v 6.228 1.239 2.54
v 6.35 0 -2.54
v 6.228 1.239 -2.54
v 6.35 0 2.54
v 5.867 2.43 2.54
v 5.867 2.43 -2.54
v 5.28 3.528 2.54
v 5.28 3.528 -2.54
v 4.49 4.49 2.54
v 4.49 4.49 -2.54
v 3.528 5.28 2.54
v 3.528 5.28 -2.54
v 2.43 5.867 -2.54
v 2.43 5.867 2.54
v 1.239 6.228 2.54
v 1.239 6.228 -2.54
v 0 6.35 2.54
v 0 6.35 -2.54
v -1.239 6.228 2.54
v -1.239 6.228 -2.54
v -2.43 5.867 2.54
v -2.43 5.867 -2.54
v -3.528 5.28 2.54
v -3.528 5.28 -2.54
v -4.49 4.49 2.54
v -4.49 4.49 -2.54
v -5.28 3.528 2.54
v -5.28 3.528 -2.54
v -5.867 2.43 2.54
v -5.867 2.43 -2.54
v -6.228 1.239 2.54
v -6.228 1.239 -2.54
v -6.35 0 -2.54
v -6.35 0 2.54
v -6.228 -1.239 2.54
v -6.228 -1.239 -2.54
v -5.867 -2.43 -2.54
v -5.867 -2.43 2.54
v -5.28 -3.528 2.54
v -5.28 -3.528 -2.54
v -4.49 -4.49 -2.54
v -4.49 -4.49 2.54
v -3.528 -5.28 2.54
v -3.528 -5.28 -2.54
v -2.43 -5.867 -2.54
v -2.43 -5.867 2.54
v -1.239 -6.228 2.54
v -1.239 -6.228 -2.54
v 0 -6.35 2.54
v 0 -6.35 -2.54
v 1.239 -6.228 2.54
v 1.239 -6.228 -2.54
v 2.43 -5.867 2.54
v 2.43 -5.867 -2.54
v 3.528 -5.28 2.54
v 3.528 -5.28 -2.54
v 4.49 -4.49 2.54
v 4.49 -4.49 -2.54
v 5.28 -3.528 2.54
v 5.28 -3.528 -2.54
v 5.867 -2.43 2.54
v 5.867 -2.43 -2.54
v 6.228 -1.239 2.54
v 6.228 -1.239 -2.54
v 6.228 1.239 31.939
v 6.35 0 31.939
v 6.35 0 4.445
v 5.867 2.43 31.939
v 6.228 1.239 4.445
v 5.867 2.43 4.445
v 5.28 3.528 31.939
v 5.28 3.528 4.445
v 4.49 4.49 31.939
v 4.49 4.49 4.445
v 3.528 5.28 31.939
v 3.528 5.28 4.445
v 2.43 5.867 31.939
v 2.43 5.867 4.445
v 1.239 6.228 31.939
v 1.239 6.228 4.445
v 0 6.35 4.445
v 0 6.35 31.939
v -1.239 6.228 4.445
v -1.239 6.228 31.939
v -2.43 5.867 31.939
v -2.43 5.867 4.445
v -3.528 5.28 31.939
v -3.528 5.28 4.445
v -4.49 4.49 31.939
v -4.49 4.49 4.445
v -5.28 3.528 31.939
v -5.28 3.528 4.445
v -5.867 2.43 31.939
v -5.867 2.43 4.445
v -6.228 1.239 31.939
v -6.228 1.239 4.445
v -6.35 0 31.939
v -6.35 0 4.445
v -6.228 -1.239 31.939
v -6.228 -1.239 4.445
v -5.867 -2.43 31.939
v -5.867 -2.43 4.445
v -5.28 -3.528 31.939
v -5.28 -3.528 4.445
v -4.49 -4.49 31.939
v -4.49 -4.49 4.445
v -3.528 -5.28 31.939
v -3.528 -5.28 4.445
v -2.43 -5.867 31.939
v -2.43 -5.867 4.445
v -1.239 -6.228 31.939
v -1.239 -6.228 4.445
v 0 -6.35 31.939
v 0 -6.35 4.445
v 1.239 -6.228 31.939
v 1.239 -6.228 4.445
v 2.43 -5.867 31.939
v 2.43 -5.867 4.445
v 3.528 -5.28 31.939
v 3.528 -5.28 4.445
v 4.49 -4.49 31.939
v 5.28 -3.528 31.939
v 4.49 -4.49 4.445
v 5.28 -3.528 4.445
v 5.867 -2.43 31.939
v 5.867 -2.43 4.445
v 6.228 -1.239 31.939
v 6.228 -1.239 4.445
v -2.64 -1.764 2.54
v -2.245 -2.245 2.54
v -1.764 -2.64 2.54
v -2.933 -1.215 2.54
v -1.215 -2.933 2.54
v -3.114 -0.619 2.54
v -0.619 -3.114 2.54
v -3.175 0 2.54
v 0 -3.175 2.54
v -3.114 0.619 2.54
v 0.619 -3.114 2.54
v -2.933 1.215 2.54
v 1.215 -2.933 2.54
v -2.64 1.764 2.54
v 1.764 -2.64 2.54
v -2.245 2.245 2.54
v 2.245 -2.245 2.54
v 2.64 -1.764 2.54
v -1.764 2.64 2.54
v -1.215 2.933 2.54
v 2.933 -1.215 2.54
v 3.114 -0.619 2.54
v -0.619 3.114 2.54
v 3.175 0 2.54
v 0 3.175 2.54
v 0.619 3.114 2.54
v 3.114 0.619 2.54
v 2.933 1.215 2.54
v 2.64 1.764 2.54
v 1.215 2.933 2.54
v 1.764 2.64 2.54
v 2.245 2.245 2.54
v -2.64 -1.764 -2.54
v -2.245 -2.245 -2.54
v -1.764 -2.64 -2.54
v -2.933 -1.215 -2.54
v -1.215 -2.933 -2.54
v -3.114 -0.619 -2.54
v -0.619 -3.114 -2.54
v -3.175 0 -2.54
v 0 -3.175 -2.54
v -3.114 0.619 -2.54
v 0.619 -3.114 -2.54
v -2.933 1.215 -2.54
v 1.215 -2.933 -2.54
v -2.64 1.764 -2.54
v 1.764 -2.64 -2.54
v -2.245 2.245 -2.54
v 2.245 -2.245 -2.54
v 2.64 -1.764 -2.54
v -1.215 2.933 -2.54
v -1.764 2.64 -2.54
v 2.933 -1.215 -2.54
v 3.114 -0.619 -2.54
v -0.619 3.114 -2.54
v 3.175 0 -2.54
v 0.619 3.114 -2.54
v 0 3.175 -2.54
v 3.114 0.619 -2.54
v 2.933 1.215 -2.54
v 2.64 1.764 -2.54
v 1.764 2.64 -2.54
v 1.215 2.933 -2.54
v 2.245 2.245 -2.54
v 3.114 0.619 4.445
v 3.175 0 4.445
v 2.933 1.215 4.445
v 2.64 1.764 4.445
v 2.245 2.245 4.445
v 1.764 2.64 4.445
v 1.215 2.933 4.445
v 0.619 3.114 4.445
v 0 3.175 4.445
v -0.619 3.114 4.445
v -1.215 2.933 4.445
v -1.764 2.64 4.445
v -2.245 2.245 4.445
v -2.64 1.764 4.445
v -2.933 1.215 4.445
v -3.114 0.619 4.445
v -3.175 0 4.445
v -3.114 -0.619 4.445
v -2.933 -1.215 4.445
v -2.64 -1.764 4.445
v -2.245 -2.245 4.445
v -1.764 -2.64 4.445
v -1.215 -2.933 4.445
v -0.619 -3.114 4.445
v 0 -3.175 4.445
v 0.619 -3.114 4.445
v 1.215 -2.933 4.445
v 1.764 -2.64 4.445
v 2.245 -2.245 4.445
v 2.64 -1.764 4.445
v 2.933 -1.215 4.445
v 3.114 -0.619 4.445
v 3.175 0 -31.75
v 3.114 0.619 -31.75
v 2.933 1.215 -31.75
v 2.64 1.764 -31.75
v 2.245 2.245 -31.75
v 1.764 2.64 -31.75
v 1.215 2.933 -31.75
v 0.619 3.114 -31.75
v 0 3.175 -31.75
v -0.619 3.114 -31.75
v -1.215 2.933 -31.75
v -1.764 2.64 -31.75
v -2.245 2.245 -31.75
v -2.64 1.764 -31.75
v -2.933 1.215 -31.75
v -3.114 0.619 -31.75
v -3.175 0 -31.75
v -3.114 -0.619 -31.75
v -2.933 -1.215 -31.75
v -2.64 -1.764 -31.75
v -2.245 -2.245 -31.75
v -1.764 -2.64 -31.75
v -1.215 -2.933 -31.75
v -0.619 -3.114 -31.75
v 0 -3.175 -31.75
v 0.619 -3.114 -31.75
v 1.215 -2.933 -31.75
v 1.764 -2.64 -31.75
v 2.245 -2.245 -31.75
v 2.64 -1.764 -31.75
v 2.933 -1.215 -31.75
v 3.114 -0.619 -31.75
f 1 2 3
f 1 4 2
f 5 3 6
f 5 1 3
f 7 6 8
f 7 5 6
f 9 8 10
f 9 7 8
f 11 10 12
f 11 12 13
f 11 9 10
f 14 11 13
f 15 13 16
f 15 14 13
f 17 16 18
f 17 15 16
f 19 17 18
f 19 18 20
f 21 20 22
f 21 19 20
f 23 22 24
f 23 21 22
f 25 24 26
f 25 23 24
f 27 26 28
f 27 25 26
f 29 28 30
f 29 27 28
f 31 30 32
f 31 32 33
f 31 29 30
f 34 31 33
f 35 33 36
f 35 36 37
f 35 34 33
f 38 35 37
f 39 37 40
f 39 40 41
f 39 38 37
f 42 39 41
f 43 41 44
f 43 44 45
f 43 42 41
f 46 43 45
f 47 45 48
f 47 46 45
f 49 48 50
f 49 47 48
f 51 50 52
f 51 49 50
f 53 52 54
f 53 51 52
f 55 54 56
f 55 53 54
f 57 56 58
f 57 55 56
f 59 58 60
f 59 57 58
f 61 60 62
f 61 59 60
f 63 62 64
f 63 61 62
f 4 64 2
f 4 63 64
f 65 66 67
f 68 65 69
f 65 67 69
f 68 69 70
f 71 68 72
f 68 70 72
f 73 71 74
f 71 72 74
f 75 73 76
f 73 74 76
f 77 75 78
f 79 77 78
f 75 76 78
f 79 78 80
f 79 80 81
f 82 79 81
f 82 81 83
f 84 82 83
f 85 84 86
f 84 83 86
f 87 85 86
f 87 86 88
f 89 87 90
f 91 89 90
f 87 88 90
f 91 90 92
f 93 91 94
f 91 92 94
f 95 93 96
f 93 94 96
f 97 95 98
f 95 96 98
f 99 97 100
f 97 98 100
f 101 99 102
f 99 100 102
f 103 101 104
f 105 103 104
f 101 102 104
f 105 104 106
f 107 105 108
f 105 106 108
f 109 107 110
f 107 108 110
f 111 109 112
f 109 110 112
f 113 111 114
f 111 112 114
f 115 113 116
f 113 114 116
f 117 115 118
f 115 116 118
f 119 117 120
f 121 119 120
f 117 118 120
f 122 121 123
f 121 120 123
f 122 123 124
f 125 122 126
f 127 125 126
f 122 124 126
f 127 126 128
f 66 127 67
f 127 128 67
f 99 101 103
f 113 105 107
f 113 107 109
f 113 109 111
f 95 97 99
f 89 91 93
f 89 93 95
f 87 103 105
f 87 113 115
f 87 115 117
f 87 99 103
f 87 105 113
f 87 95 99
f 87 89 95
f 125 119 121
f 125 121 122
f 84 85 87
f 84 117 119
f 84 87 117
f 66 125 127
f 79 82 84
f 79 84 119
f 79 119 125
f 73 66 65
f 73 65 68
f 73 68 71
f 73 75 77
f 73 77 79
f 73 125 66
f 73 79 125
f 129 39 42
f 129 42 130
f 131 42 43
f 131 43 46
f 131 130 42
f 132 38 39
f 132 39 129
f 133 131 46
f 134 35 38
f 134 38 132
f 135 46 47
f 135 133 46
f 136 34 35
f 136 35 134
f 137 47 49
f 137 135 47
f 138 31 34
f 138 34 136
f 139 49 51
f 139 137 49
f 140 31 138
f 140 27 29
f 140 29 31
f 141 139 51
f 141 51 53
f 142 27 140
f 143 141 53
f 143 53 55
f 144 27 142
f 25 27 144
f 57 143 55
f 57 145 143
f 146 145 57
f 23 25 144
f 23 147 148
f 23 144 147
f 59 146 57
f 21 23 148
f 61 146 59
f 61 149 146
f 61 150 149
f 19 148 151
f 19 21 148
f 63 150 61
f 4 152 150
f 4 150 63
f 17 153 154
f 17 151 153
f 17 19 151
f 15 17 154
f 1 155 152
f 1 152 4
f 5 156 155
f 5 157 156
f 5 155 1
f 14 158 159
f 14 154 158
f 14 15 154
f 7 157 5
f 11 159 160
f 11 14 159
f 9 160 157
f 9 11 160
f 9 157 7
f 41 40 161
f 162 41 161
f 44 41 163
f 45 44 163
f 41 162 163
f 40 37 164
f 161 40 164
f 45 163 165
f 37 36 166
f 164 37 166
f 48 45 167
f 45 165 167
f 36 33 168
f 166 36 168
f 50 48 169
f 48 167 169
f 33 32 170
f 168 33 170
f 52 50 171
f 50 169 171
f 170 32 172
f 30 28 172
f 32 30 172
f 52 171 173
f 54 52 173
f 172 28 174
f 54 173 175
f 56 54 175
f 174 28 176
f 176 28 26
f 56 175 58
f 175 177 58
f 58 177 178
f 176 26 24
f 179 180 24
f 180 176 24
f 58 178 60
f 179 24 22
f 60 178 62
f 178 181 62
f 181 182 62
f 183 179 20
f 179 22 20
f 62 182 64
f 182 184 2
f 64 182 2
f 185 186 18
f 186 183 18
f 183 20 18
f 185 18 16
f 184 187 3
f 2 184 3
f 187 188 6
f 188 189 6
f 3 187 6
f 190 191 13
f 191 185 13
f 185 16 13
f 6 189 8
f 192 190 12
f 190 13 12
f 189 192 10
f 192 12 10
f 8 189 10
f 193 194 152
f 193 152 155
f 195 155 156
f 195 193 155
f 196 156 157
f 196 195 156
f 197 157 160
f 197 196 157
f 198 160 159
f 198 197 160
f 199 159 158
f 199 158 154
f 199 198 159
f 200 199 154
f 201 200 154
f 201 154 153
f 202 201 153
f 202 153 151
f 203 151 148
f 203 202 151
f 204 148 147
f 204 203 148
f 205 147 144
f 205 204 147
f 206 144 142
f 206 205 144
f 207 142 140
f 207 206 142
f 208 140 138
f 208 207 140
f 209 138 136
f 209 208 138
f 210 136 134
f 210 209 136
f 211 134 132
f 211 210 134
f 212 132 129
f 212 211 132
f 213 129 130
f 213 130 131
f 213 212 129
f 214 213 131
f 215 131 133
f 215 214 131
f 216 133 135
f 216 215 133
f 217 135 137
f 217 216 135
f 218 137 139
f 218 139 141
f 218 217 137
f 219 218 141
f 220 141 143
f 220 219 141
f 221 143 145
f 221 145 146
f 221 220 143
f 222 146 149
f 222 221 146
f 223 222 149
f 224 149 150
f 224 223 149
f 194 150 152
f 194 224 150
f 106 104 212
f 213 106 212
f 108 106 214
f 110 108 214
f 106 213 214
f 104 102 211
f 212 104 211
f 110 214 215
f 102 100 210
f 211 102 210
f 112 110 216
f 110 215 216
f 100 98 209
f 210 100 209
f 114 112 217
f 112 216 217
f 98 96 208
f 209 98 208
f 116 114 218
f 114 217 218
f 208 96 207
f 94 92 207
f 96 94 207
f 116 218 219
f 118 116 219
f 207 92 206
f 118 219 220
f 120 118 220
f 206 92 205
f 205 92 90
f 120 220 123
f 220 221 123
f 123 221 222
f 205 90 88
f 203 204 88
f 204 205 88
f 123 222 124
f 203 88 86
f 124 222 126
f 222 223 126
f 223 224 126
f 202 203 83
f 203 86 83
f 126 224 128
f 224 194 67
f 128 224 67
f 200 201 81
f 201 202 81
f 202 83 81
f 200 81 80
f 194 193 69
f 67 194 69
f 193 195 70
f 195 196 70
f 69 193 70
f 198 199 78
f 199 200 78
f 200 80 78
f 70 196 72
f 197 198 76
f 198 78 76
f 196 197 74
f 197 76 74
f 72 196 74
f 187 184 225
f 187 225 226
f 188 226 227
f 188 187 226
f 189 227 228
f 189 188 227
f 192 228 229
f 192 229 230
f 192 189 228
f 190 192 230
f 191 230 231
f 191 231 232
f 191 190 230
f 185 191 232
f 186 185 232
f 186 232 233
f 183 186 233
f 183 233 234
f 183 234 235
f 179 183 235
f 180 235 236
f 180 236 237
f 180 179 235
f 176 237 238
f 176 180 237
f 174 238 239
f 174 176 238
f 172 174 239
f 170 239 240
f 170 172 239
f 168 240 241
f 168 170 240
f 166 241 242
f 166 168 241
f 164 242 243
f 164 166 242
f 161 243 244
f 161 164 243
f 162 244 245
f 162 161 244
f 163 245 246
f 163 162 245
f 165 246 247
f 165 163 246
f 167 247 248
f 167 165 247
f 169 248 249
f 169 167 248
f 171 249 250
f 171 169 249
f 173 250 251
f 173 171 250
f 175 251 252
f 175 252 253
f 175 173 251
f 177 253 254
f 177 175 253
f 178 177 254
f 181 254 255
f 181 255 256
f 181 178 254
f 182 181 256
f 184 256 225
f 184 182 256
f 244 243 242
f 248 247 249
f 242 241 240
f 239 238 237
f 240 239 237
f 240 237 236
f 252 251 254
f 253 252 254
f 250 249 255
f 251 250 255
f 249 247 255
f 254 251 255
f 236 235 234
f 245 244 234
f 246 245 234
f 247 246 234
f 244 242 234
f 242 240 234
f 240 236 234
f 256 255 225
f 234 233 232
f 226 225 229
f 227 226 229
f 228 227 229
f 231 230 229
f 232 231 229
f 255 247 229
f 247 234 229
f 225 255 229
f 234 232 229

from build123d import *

# Parameters (mm, degrees)
F0_R     = 3.175
F2_DEPTH = 31.75
F1_R     = 6.35
F3_DEPTH = 2.54
F5_R     = 6.35
F6_DEPTH = 27.49417


with BuildPart() as f2:
    # F0 (on Top) → F2 (new body, symmetric)
    with BuildSketch(Plane.XY):
        Circle(F0_R)
    extrude(amount=F2_DEPTH, both=True)

    # F1 (on Top) → F3 (join, symmetric)
    with BuildSketch(Plane.XY):
        Circle(F1_R)
    extrude(amount=F3_DEPTH, both=True)

    # F5 (on offset) → F6 (join)
    with BuildSketch(Plane.XY.offset(4.445)):
        Circle(F5_R)
    extrude(amount=F6_DEPTH)


solid = f2.part
